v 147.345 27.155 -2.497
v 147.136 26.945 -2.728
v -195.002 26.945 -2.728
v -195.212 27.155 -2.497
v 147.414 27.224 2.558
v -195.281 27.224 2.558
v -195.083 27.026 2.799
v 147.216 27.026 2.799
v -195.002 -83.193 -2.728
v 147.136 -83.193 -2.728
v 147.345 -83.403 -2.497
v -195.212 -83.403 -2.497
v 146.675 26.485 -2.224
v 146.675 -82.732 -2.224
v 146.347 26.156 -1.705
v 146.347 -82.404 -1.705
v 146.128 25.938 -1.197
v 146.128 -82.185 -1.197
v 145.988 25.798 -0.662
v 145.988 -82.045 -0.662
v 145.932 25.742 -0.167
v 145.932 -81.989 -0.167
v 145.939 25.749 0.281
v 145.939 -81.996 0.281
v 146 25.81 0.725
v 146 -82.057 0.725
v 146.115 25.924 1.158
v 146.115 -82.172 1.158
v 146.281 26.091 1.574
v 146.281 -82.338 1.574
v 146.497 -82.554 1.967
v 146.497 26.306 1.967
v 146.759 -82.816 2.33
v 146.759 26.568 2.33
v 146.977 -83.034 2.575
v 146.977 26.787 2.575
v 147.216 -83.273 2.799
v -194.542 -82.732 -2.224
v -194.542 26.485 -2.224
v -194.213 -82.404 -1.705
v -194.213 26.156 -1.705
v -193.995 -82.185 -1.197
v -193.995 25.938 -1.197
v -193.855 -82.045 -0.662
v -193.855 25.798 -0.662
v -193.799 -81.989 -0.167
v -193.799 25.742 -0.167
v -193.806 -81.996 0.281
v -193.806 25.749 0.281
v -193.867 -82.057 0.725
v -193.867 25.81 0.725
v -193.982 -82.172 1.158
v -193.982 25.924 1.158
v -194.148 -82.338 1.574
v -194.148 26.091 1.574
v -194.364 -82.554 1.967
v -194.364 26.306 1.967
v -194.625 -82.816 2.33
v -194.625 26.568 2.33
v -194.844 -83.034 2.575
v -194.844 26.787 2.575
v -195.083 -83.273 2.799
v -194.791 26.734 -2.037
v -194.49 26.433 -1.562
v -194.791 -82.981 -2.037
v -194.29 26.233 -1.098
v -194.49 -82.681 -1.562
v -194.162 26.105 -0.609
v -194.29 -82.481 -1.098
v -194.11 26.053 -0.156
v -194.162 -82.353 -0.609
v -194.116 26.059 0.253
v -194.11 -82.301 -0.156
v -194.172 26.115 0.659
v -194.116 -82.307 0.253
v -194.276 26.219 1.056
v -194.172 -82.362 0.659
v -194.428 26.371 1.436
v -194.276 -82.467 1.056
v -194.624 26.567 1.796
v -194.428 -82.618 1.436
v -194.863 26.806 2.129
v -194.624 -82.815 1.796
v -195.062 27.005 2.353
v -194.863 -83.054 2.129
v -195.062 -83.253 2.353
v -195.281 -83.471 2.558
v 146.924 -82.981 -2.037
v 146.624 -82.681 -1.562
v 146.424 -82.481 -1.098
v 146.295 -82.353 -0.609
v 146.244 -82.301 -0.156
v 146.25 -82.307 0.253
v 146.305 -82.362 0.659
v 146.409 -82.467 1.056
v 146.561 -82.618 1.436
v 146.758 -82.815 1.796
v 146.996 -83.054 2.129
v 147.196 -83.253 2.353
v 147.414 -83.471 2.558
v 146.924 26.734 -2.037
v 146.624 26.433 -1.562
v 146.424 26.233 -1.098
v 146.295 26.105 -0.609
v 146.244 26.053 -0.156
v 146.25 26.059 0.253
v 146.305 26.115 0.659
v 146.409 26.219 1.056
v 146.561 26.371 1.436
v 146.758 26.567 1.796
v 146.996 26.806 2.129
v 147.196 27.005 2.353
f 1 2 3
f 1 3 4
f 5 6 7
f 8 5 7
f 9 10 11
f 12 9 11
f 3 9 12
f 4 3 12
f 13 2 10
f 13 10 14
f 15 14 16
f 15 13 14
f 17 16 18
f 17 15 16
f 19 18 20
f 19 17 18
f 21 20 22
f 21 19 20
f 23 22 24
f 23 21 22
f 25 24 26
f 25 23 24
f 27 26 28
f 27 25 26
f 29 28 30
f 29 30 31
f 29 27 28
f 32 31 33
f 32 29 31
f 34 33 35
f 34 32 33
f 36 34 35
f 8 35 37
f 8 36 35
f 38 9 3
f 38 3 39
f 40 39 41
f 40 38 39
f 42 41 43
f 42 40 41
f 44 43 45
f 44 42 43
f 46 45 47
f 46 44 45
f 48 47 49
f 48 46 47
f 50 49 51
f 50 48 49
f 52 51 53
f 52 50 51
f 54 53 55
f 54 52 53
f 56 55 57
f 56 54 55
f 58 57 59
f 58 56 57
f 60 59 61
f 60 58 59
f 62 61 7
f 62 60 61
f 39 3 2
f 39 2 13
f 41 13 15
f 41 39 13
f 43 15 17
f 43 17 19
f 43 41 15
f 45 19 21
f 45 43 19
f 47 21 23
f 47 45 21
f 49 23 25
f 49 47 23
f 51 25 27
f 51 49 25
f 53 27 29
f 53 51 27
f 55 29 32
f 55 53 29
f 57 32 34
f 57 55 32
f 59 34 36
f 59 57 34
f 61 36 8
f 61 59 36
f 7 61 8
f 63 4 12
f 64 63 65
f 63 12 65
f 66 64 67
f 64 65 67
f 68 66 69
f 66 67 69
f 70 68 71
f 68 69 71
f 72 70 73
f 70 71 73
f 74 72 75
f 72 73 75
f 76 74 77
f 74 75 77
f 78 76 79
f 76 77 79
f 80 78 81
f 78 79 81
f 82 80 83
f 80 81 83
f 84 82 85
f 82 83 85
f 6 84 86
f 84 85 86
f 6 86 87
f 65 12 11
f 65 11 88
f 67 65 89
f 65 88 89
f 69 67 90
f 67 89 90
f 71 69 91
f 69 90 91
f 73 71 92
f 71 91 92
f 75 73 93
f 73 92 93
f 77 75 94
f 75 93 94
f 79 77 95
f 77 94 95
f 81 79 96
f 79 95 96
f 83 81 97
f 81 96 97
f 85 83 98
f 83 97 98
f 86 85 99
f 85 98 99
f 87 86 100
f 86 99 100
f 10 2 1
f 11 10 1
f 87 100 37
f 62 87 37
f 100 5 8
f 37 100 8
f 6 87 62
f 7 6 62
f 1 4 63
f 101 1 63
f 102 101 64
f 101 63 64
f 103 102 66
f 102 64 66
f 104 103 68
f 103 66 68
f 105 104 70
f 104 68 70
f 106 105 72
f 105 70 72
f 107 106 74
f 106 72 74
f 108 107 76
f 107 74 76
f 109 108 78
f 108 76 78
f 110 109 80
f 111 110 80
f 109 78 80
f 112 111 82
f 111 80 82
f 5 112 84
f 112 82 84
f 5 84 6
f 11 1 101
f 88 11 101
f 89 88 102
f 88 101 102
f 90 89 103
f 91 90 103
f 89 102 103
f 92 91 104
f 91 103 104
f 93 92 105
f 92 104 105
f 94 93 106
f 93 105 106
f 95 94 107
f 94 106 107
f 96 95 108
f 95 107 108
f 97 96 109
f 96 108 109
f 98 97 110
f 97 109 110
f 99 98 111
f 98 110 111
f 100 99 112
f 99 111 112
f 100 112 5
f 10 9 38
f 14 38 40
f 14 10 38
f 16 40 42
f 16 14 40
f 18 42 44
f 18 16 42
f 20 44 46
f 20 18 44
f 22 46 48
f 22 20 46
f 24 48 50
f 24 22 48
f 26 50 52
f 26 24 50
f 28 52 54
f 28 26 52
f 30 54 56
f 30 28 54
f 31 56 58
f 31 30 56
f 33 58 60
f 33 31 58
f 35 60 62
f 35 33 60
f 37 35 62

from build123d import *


with BuildPart() as part:
    # Sweep1: sweep along a path in Sketch6
    with BuildLine(Plane.XY) as sweep1_path:
        Line((-194.933333333, 26.876190476), (-194.933333333, -83.123809524))
        Line((-194.933333333, -83.123809524), (147.066666667, -83.123809524))
        Line((147.066666667, -83.123809524), (147.066666667, 26.876190476))
        Line((147.066666667, 26.876190476), (-194.933333333, 26.876190476))
    # Sketch7 → Sweep1 (sweep)
    with BuildSketch(Plane(origin=(0, 0, 0), x_dir=(0, 0, -1), z_dir=(1, 0, 0))):
        with BuildLine():
            Line((2.727993364, 26.945293334), (2.497196154, 27.154925683))
            ThreePointArc((2.497196154, 27.154925683), (-0.045784316, 26.049902517), (-2.557836818, 27.223537083))
            Line((-2.557836818, 27.223537083), (-2.798892732, 27.025668774))
            ThreePointArc((-2.798892732, 27.025668774), (-0.053588552, 25.738191345), (2.727993364, 26.945293334))
        make_face()
    sweep(path=sweep1_path.line, transition=Transition.RIGHT)


solid = part.part
